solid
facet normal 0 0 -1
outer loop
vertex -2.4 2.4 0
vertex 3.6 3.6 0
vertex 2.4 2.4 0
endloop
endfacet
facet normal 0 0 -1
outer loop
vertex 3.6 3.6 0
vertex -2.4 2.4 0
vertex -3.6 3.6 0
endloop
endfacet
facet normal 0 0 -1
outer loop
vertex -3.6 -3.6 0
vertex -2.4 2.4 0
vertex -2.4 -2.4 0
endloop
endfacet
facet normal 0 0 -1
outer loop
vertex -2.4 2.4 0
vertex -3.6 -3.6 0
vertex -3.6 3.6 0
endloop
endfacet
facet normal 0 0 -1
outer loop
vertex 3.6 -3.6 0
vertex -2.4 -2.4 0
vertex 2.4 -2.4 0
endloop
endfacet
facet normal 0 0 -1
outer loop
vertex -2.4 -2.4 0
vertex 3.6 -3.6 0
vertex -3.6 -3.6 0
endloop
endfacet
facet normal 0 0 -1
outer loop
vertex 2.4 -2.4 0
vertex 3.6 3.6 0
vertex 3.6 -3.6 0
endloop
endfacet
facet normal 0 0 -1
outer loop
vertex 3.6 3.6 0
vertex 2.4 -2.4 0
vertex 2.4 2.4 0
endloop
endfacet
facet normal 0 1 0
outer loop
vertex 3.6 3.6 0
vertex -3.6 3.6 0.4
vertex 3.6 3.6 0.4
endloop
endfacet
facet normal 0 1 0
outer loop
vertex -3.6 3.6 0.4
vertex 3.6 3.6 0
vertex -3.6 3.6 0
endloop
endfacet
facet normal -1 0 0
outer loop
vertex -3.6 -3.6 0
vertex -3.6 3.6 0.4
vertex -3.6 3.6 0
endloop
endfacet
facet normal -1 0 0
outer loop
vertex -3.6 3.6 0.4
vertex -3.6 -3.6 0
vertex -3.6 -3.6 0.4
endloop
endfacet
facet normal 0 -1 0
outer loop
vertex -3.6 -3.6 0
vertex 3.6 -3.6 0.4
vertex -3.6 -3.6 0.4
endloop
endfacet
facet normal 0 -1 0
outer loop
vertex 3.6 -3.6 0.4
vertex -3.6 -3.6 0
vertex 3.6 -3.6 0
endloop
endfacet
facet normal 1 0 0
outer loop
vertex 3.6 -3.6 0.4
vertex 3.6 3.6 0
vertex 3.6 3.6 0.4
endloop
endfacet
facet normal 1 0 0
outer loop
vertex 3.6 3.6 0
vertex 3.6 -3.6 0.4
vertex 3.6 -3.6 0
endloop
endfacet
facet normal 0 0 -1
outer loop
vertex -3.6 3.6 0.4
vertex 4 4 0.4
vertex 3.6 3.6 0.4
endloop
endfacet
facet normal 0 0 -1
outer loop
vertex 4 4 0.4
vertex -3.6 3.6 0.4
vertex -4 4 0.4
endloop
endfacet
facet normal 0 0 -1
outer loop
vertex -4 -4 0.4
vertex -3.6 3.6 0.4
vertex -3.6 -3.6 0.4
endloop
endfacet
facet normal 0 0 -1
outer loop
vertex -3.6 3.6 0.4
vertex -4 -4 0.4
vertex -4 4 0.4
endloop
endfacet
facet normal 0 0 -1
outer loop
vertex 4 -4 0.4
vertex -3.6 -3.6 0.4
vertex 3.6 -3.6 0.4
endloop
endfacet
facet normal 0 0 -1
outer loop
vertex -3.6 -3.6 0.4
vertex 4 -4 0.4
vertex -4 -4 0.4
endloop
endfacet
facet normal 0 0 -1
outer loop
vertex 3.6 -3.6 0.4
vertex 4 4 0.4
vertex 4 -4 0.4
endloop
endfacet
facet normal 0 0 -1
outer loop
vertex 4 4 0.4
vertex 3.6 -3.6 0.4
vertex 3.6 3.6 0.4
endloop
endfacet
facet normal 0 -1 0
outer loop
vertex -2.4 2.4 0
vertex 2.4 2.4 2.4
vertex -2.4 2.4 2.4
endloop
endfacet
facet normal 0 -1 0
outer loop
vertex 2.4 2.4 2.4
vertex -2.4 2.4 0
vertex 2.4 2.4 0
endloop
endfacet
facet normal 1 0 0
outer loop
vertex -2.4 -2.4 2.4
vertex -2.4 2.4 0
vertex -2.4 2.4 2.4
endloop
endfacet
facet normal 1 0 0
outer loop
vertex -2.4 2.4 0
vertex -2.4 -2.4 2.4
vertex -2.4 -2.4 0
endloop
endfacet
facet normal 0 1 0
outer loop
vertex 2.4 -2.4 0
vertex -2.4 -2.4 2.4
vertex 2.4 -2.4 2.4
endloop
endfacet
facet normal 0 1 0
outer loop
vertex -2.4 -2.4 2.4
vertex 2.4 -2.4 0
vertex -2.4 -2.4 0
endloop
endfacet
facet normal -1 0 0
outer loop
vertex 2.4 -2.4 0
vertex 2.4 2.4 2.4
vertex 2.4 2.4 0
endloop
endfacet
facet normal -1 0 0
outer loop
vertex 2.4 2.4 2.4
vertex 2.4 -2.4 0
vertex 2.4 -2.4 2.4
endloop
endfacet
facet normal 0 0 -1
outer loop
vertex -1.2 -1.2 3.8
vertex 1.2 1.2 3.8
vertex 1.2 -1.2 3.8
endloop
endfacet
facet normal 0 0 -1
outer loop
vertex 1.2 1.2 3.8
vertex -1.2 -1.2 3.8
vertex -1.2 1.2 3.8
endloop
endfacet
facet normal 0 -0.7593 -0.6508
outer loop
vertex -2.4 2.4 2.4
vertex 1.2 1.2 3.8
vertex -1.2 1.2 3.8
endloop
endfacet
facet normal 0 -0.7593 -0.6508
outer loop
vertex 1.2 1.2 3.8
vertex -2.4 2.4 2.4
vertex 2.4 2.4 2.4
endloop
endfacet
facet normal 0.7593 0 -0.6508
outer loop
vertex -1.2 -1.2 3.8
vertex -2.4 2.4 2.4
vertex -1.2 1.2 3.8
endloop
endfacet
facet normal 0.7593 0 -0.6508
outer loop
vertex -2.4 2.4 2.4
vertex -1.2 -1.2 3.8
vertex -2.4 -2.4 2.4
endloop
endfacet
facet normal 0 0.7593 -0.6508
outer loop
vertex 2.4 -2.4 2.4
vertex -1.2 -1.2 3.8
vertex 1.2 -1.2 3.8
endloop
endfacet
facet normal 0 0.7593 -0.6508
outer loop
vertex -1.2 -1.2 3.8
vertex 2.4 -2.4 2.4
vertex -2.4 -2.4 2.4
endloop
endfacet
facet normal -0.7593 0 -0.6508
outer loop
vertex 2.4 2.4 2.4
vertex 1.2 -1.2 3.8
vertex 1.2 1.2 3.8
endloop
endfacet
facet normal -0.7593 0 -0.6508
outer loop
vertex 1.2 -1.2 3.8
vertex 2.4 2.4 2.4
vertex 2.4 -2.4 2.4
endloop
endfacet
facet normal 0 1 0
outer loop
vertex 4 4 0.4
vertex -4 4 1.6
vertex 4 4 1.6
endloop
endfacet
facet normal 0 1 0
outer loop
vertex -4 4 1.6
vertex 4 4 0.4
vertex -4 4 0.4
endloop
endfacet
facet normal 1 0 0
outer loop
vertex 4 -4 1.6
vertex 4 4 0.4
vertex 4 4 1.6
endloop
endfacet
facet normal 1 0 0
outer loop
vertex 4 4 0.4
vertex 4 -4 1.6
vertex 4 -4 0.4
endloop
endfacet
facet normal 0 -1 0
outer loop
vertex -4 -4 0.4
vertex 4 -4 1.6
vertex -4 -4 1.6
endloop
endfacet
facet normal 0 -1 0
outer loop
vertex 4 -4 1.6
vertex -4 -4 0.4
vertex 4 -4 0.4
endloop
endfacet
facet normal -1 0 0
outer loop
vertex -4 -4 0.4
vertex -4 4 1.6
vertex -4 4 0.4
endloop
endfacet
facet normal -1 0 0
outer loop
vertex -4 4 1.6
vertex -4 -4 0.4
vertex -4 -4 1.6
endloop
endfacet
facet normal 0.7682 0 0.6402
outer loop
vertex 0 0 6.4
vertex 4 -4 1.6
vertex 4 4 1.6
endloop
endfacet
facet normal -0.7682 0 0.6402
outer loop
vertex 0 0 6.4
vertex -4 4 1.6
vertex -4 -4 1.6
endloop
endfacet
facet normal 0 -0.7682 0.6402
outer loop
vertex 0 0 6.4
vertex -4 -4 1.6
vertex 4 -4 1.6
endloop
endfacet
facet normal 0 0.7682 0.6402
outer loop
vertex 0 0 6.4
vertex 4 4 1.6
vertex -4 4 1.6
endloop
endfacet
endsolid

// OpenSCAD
// file: ../p/triangle.scad
use <../lib.scad>
function ldraw_lib__triangle() = [
// 0 Triangle
// 0 Name: triangle.dat
// 0 Author: Steffen [Steffen]
// 0 !LDRAW_ORG Primitive UPDATE 2013-01
// 0 !LICENSE Licensed under CC BY 4.0 : see CAreadme.txt
// 
// 0 BFC CERTIFY CCW
  [0,"BFC","CERTIFY"],
  [0,"BFC","CCW"],
// 
// 0 !HISTORY 2013-07-21 [PTadmin] Official Update 2013-01
// 
// 
// 3 16 0 0 0 1 0 0 0 0 1
  [3,16,0,0,0,1,0,0,0,0,1],
// 2 24 0 0 0 1 0 0
  [2,24,0,0,0,1,0,0],
// 2 24 1 0 0 0 0 1
  [2,24,1,0,0,0,0,1],
// 2 24 0 0 1 0 0 0
  [2,24,0,0,1,0,0,0],
];
module ldraw_lib__triangle(step=0, col=false, unit=2/5, alt=false, line=0.2, solid=!$preview)
    makepoly(ldraw_lib__triangle(), step=step, col=col, unit=unit, alt=alt, line=line, solid=solid);
ldraw_lib__triangle(line=0.2);
// file: ../p/rect.scad
use <../lib.scad>
function ldraw_lib__rect() = [
// 0 Rectangle
// 0 Name: rect.dat
// 0 Author: James Jessiman
// 0 !LDRAW_ORG Primitive UPDATE 2010-01
// 0 !LICENSE Licensed under CC BY 4.0 : see CAreadme.txt
// 
// 0 BFC CERTIFY CCW
  [0,"BFC","CERTIFY"],
  [0,"BFC","CCW"],
// 
// 0 !HISTORY 2002-04-05 [hafhead] Added BFC statement
// 0 !HISTORY 2002-04-25 [PTadmin] Official Update 2002-02
// 0 !HISTORY 2007-06-24 [PTadmin] Header formatted for Contributor Agreement
// 0 !HISTORY 2008-07-01 [PTadmin] Official Update 2008-01
// 0 !HISTORY 2010-01-17 [mikeheide] changed winding to CCW
// 0 !HISTORY 2010-04-05 [PTadmin] Official Update 2010-01
// 
// 
// 2 24 1 0 1 -1 0 1
  [2,24,1,0,1,-1,0,1],
// 2 24 -1 0 1 -1 0 -1
  [2,24,-1,0,1,-1,0,-1],
// 2 24 -1 0 -1 1 0 -1
  [2,24,-1,0,-1,1,0,-1],
// 2 24 1 0 -1 1 0 1
  [2,24,1,0,-1,1,0,1],
// 4 16 -1 0 1 -1 0 -1 1 0 -1 1 0 1
  [4,16,-1,0,1,-1,0,-1,1,0,-1,1,0,1],
// 0
];
module ldraw_lib__rect(step=0, col=false, unit=2/5, alt=false, line=0.2, solid=!$preview)
    makepoly(ldraw_lib__rect(), step=step, col=col, unit=unit, alt=alt, line=line, solid=solid);
ldraw_lib__rect(line=0.2);
// file: ../p/box4o4a.scad
use <../lib.scad>
function ldraw_lib__box4o4a() = [
// 0 Box with 4 Faces (2 Parallel Pairs) without Bottom Edges
// 0 Name: box4o4a.dat
// 0 Author: Donald Sutter [technog]
// 0 !LDRAW_ORG Primitive UPDATE 2012-01
// 0 !LICENSE Licensed under CC BY 4.0 : see CAreadme.txt
// 
// 0 BFC CERTIFY CCW
  [0,"BFC","CERTIFY"],
  [0,"BFC","CCW"],
// 
// 0 !HISTORY 2003-08-01 [PTadmin] Official Update 2003-02
// 0 !HISTORY 2007-06-24 [PTadmin] Header formatted for Contributor Agreement
// 0 !HISTORY 2008-07-01 [PTadmin] Official Update 2008-01
// 0 !HISTORY 2012-02-16 [Philo] Changed to CCW
// 0 !HISTORY 2012-03-30 [PTadmin] Official Update 2012-01
// 
// 
// 2 24 1 0 1 -1 0 1
  [2,24,1,0,1,-1,0,1],
// 2 24 -1 0 1 -1 0 -1
  [2,24,-1,0,1,-1,0,-1],
// 2 24 -1 0 -1 1 0 -1
  [2,24,-1,0,-1,1,0,-1],
// 2 24 1 0 -1 1 0 1
  [2,24,1,0,-1,1,0,1],
// 2 24 1 0 1 1 1 1
  [2,24,1,0,1,1,1,1],
// 2 24 -1 0 1 -1 1 1
  [2,24,-1,0,1,-1,1,1],
// 2 24 1 0 -1 1 1 -1
  [2,24,1,0,-1,1,1,-1],
// 2 24 -1 0 -1 -1 1 -1
  [2,24,-1,0,-1,-1,1,-1],
// 4 16 -1 1 1 -1 0 1 1 0 1 1 1 1
  [4,16,-1,1,1,-1,0,1,1,0,1,1,1,1],
// 4 16 -1 1 -1 -1 0 -1 -1 0 1 -1 1 1
  [4,16,-1,1,-1,-1,0,-1,-1,0,1,-1,1,1],
// 4 16 1 1 -1 1 0 -1 -1 0 -1 -1 1 -1
  [4,16,1,1,-1,1,0,-1,-1,0,-1,-1,1,-1],
// 4 16 1 1 1 1 0 1 1 0 -1 1 1 -1
  [4,16,1,1,1,1,0,1,1,0,-1,1,1,-1],
];
module ldraw_lib__box4o4a(step=0, col=false, unit=2/5, alt=false, line=0.2, solid=!$preview)
    makepoly(ldraw_lib__box4o4a(), step=step, col=col, unit=unit, alt=alt, line=line, solid=solid);
ldraw_lib__box4o4a(line=0.2);
// file: ../p/box4.scad
use <../lib.scad>
function ldraw_lib__box4() = [
// 0 Box with 4 Faces (2 Parallel Pairs) and All Edges
// 0 Name: box4.dat
// 0 Author: James Jessiman
// 0 !LDRAW_ORG Primitive UPDATE 2012-01
// 0 !LICENSE Licensed under CC BY 4.0 : see CAreadme.txt
// 
// 0 BFC CERTIFY CCW
  [0,"BFC","CERTIFY"],
  [0,"BFC","CCW"],
// 
// 0 !HISTORY 2002-04-03 [sbliss] Modified for BFC compliance
// 0 !HISTORY 2002-04-25 [PTadmin] Official Update 2002-02
// 0 !HISTORY 2007-06-24 [PTadmin] Header formatted for Contributor Agreement
// 0 !HISTORY 2008-07-01 [PTadmin] Official Update 2008-01
// 0 !HISTORY 2012-02-16 [Philo] Changed to CCW
// 0 !HISTORY 2012-03-30 [PTadmin] Official Update 2012-01
// 
// 
// 2 24 1 1 1 -1 1 1
  [2,24,1,1,1,-1,1,1],
// 2 24 -1 1 1 -1 1 -1
  [2,24,-1,1,1,-1,1,-1],
// 2 24 -1 1 -1 1 1 -1
  [2,24,-1,1,-1,1,1,-1],
// 2 24 1 1 -1 1 1 1
  [2,24,1,1,-1,1,1,1],
// 2 24 1 0 1 -1 0 1
  [2,24,1,0,1,-1,0,1],
// 2 24 -1 0 1 -1 0 -1
  [2,24,-1,0,1,-1,0,-1],
// 2 24 -1 0 -1 1 0 -1
  [2,24,-1,0,-1,1,0,-1],
// 2 24 1 0 -1 1 0 1
  [2,24,1,0,-1,1,0,1],
// 2 24 1 0 1 1 1 1
  [2,24,1,0,1,1,1,1],
// 2 24 -1 0 1 -1 1 1
  [2,24,-1,0,1,-1,1,1],
// 2 24 1 0 -1 1 1 -1
  [2,24,1,0,-1,1,1,-1],
// 2 24 -1 0 -1 -1 1 -1
  [2,24,-1,0,-1,-1,1,-1],
// 4 16 -1 1 1 -1 0 1 1 0 1 1 1 1
  [4,16,-1,1,1,-1,0,1,1,0,1,1,1,1],
// 4 16 -1 1 -1 -1 0 -1 -1 0 1 -1 1 1
  [4,16,-1,1,-1,-1,0,-1,-1,0,1,-1,1,1],
// 4 16 1 1 -1 1 0 -1 -1 0 -1 -1 1 -1
  [4,16,1,1,-1,1,0,-1,-1,0,-1,-1,1,-1],
// 4 16 1 1 1 1 0 1 1 0 -1 1 1 -1
  [4,16,1,1,1,1,0,1,1,0,-1,1,1,-1],
];
module ldraw_lib__box4(step=0, col=false, unit=2/5, alt=false, line=0.2, solid=!$preview)
    makepoly(ldraw_lib__box4(), step=step, col=col, unit=unit, alt=alt, line=line, solid=solid);
ldraw_lib__box4(line=0.2);
// file: 22388.scad
use <../lib.scad>
use <../p/box4.scad>
use <../p/box4o4a.scad>
use <../p/rect.scad>
use <../p/triangle.scad>
function ldraw_lib__22388() = [
// 0 Slope Brick 50  1 x  1 x  0.667 Quadruple
// 0 Name: 22388.dat
// 0 Author: Magnus Forsberg [MagFors]
// 0 !LDRAW_ORG Part UPDATE 2016-01
// 0 !LICENSE Licensed under CC BY 4.0 : see CAreadme.txt
// 
// 0 BFC CERTIFY CCW
  [0,"BFC","CERTIFY"],
  [0,"BFC","CCW"],
// 
// 0 !HISTORY 2016-12-31 [PTadmin] Official Update 2016-01
// 
// 
// 4 16 9 0 9 6 0 6 -6 0 6 -9 0 9
  [4,16,9,0,9,6,0,6,-6,0,6,-9,0,9],
// 4 16 -9 0 9 -6 0 6 -6 0 -6 -9 0 -9
  [4,16,-9,0,9,-6,0,6,-6,0,-6,-9,0,-9],
// 4 16 -9 0 -9 -6 0 -6 6 0 -6 9 0 -9
  [4,16,-9,0,-9,-6,0,-6,6,0,-6,9,0,-9],
// 4 16 9 0 -9 6 0 -6 6 0 6 9 0 9
  [4,16,9,0,-9,6,0,-6,6,0,6,9,0,9],
// 1 16 0 -1 0 9 0 0 0 1 0 0 0 9 box4.dat
  [1,16,0,-1,0,9,0,0,0,1,0,0,0,9, ldraw_lib__box4()],
// 4 16 10 -1 10 9 -1 9 -9 -1 9 -10 -1 10
  [4,16,10,-1,10,9,-1,9,-9,-1,9,-10,-1,10],
// 4 16 -10 -1 10 -9 -1 9 -9 -1 -9 -10 -1 -10
  [4,16,-10,-1,10,-9,-1,9,-9,-1,-9,-10,-1,-10],
// 4 16 -10 -1 -10 -9 -1 -9 9 -1 -9 10 -1 -10
  [4,16,-10,-1,-10,-9,-1,-9,9,-1,-9,10,-1,-10],
// 4 16 10 -1 -10 9 -1 -9 9 -1 9 10 -1 10
  [4,16,10,-1,-10,9,-1,-9,9,-1,9,10,-1,10],
// 0 BFC INVERTNEXT
  [0,"BFC","INVERTNEXT"],
// 1 16 0 0 0 6 0 0 0 -6 0 0 0 6 box4.dat
  [1,16,0,0,0,6,0,0,0,-6,0,0,0,6, ldraw_lib__box4()],
// 1 16 0 -9.5 0 -3 0 0 0 -1 0 0 0 3 rect.dat
  [1,16,0,-9.5,0,-3,0,0,0,-1,0,0,0,3, ldraw_lib__rect()],
// 2 24 6 -6 6 3 -9.5 3
  [2,24,6,-6,6,3,-9.5,3],
// 2 24 -6 -6 6 -3 -9.5 3
  [2,24,-6,-6,6,-3,-9.5,3],
// 2 24 -6 -6 -6 -3 -9.5 -3
  [2,24,-6,-6,-6,-3,-9.5,-3],
// 2 24 6 -6 -6 3 -9.5 -3
  [2,24,6,-6,-6,3,-9.5,-3],
// 4 16 6 -6 6 3 -9.5 3 -3 -9.5 3 -6 -6 6
  [4,16,6,-6,6,3,-9.5,3,-3,-9.5,3,-6,-6,6],
// 4 16 -6 -6 6 -3 -9.5 3 -3 -9.5 -3 -6 -6 -6
  [4,16,-6,-6,6,-3,-9.5,3,-3,-9.5,-3,-6,-6,-6],
// 4 16 -6 -6 -6 -3 -9.5 -3 3 -9.5 -3 6 -6 -6
  [4,16,-6,-6,-6,-3,-9.5,-3,3,-9.5,-3,6,-6,-6],
// 4 16 6 -6 -6 3 -9.5 -3 3 -9.5 3 6 -6 6
  [4,16,6,-6,-6,3,-9.5,-3,3,-9.5,3,6,-6,6],
// 1 16 0 -1 0 -10 0 0 0 -3 0 0 0 10 box4o4a.dat
  [1,16,0,-1,0,-10,0,0,0,-3,0,0,0,10, ldraw_lib__box4o4a()],
// 1 16 0 -16 0 10 0 10 12 1 12 -10 0 10 triangle.dat
  [1,16,0,-16,0,10,0,10,12,1,12,-10,0,10, ldraw_lib__triangle()],
// 1 16 0 -16 0 -10 0 -10 12 1 12 10 0 -10 triangle.dat
  [1,16,0,-16,0,-10,0,-10,12,1,12,10,0,-10, ldraw_lib__triangle()],
// 2 24 -10 -4 -10 10 -4 -10
  [2,24,-10,-4,-10,10,-4,-10],
// 2 24 10 -4 10 -10 -4 10
  [2,24,10,-4,10,-10,-4,10],
// 3 16 0 -16 0 -10 -4 -10 10 -4 -10
  [3,16,0,-16,0,-10,-4,-10,10,-4,-10],
// 3 16 0 -16 0 10 -4 10 -10 -4 10
  [3,16,0,-16,0,10,-4,10,-10,-4,10],
];
module ldraw_lib__22388(step=0, col=false, unit=2/5, alt=false, line=0.2, solid=!$preview)
    makepoly(ldraw_lib__22388(), step=step, col=col, unit=unit, alt=alt, line=line, solid=solid);
ldraw_lib__22388(line=0.2);
// main file
use <../lib.scad>
use <22388.scad>
function ldraw_lib__35344() = [
// 0 =Slope Brick 50  1 x  1 x  0.667 Quadruple
// 0 Name: 35344.dat
// 0 Author: Massimo Maso [Sirio]
// 0 !LDRAW_ORG Part Alias UPDATE 2025-05
// 0 !LICENSE Licensed under CC BY 4.0 : see CAreadme.txt
// 
// 0 BFC CERTIFY CCW
  [0,"BFC","CERTIFY"],
  [0,"BFC","CCW"],
// 
// 0 !KEYWORDS BrickLink 22388, Rebrickable 22388
// 
// 0 !HISTORY 2025-05-28 [OrionP] Official Update 2025-05
// 
// 1 16 0 0 0 1 0 0 0 1 0 0 0 1 22388.dat
  [1,16,0,0,0,1,0,0,0,1,0,0,0,1, ldraw_lib__22388()],
];
module ldraw_lib__35344(step=0, col=false, unit=2/5, alt=false, line=0.2, solid=!$preview)
    makepoly(ldraw_lib__35344(), step=step, col=col, unit=unit, alt=alt, line=line, solid=solid);
ldraw_lib__35344(line=0.2);
